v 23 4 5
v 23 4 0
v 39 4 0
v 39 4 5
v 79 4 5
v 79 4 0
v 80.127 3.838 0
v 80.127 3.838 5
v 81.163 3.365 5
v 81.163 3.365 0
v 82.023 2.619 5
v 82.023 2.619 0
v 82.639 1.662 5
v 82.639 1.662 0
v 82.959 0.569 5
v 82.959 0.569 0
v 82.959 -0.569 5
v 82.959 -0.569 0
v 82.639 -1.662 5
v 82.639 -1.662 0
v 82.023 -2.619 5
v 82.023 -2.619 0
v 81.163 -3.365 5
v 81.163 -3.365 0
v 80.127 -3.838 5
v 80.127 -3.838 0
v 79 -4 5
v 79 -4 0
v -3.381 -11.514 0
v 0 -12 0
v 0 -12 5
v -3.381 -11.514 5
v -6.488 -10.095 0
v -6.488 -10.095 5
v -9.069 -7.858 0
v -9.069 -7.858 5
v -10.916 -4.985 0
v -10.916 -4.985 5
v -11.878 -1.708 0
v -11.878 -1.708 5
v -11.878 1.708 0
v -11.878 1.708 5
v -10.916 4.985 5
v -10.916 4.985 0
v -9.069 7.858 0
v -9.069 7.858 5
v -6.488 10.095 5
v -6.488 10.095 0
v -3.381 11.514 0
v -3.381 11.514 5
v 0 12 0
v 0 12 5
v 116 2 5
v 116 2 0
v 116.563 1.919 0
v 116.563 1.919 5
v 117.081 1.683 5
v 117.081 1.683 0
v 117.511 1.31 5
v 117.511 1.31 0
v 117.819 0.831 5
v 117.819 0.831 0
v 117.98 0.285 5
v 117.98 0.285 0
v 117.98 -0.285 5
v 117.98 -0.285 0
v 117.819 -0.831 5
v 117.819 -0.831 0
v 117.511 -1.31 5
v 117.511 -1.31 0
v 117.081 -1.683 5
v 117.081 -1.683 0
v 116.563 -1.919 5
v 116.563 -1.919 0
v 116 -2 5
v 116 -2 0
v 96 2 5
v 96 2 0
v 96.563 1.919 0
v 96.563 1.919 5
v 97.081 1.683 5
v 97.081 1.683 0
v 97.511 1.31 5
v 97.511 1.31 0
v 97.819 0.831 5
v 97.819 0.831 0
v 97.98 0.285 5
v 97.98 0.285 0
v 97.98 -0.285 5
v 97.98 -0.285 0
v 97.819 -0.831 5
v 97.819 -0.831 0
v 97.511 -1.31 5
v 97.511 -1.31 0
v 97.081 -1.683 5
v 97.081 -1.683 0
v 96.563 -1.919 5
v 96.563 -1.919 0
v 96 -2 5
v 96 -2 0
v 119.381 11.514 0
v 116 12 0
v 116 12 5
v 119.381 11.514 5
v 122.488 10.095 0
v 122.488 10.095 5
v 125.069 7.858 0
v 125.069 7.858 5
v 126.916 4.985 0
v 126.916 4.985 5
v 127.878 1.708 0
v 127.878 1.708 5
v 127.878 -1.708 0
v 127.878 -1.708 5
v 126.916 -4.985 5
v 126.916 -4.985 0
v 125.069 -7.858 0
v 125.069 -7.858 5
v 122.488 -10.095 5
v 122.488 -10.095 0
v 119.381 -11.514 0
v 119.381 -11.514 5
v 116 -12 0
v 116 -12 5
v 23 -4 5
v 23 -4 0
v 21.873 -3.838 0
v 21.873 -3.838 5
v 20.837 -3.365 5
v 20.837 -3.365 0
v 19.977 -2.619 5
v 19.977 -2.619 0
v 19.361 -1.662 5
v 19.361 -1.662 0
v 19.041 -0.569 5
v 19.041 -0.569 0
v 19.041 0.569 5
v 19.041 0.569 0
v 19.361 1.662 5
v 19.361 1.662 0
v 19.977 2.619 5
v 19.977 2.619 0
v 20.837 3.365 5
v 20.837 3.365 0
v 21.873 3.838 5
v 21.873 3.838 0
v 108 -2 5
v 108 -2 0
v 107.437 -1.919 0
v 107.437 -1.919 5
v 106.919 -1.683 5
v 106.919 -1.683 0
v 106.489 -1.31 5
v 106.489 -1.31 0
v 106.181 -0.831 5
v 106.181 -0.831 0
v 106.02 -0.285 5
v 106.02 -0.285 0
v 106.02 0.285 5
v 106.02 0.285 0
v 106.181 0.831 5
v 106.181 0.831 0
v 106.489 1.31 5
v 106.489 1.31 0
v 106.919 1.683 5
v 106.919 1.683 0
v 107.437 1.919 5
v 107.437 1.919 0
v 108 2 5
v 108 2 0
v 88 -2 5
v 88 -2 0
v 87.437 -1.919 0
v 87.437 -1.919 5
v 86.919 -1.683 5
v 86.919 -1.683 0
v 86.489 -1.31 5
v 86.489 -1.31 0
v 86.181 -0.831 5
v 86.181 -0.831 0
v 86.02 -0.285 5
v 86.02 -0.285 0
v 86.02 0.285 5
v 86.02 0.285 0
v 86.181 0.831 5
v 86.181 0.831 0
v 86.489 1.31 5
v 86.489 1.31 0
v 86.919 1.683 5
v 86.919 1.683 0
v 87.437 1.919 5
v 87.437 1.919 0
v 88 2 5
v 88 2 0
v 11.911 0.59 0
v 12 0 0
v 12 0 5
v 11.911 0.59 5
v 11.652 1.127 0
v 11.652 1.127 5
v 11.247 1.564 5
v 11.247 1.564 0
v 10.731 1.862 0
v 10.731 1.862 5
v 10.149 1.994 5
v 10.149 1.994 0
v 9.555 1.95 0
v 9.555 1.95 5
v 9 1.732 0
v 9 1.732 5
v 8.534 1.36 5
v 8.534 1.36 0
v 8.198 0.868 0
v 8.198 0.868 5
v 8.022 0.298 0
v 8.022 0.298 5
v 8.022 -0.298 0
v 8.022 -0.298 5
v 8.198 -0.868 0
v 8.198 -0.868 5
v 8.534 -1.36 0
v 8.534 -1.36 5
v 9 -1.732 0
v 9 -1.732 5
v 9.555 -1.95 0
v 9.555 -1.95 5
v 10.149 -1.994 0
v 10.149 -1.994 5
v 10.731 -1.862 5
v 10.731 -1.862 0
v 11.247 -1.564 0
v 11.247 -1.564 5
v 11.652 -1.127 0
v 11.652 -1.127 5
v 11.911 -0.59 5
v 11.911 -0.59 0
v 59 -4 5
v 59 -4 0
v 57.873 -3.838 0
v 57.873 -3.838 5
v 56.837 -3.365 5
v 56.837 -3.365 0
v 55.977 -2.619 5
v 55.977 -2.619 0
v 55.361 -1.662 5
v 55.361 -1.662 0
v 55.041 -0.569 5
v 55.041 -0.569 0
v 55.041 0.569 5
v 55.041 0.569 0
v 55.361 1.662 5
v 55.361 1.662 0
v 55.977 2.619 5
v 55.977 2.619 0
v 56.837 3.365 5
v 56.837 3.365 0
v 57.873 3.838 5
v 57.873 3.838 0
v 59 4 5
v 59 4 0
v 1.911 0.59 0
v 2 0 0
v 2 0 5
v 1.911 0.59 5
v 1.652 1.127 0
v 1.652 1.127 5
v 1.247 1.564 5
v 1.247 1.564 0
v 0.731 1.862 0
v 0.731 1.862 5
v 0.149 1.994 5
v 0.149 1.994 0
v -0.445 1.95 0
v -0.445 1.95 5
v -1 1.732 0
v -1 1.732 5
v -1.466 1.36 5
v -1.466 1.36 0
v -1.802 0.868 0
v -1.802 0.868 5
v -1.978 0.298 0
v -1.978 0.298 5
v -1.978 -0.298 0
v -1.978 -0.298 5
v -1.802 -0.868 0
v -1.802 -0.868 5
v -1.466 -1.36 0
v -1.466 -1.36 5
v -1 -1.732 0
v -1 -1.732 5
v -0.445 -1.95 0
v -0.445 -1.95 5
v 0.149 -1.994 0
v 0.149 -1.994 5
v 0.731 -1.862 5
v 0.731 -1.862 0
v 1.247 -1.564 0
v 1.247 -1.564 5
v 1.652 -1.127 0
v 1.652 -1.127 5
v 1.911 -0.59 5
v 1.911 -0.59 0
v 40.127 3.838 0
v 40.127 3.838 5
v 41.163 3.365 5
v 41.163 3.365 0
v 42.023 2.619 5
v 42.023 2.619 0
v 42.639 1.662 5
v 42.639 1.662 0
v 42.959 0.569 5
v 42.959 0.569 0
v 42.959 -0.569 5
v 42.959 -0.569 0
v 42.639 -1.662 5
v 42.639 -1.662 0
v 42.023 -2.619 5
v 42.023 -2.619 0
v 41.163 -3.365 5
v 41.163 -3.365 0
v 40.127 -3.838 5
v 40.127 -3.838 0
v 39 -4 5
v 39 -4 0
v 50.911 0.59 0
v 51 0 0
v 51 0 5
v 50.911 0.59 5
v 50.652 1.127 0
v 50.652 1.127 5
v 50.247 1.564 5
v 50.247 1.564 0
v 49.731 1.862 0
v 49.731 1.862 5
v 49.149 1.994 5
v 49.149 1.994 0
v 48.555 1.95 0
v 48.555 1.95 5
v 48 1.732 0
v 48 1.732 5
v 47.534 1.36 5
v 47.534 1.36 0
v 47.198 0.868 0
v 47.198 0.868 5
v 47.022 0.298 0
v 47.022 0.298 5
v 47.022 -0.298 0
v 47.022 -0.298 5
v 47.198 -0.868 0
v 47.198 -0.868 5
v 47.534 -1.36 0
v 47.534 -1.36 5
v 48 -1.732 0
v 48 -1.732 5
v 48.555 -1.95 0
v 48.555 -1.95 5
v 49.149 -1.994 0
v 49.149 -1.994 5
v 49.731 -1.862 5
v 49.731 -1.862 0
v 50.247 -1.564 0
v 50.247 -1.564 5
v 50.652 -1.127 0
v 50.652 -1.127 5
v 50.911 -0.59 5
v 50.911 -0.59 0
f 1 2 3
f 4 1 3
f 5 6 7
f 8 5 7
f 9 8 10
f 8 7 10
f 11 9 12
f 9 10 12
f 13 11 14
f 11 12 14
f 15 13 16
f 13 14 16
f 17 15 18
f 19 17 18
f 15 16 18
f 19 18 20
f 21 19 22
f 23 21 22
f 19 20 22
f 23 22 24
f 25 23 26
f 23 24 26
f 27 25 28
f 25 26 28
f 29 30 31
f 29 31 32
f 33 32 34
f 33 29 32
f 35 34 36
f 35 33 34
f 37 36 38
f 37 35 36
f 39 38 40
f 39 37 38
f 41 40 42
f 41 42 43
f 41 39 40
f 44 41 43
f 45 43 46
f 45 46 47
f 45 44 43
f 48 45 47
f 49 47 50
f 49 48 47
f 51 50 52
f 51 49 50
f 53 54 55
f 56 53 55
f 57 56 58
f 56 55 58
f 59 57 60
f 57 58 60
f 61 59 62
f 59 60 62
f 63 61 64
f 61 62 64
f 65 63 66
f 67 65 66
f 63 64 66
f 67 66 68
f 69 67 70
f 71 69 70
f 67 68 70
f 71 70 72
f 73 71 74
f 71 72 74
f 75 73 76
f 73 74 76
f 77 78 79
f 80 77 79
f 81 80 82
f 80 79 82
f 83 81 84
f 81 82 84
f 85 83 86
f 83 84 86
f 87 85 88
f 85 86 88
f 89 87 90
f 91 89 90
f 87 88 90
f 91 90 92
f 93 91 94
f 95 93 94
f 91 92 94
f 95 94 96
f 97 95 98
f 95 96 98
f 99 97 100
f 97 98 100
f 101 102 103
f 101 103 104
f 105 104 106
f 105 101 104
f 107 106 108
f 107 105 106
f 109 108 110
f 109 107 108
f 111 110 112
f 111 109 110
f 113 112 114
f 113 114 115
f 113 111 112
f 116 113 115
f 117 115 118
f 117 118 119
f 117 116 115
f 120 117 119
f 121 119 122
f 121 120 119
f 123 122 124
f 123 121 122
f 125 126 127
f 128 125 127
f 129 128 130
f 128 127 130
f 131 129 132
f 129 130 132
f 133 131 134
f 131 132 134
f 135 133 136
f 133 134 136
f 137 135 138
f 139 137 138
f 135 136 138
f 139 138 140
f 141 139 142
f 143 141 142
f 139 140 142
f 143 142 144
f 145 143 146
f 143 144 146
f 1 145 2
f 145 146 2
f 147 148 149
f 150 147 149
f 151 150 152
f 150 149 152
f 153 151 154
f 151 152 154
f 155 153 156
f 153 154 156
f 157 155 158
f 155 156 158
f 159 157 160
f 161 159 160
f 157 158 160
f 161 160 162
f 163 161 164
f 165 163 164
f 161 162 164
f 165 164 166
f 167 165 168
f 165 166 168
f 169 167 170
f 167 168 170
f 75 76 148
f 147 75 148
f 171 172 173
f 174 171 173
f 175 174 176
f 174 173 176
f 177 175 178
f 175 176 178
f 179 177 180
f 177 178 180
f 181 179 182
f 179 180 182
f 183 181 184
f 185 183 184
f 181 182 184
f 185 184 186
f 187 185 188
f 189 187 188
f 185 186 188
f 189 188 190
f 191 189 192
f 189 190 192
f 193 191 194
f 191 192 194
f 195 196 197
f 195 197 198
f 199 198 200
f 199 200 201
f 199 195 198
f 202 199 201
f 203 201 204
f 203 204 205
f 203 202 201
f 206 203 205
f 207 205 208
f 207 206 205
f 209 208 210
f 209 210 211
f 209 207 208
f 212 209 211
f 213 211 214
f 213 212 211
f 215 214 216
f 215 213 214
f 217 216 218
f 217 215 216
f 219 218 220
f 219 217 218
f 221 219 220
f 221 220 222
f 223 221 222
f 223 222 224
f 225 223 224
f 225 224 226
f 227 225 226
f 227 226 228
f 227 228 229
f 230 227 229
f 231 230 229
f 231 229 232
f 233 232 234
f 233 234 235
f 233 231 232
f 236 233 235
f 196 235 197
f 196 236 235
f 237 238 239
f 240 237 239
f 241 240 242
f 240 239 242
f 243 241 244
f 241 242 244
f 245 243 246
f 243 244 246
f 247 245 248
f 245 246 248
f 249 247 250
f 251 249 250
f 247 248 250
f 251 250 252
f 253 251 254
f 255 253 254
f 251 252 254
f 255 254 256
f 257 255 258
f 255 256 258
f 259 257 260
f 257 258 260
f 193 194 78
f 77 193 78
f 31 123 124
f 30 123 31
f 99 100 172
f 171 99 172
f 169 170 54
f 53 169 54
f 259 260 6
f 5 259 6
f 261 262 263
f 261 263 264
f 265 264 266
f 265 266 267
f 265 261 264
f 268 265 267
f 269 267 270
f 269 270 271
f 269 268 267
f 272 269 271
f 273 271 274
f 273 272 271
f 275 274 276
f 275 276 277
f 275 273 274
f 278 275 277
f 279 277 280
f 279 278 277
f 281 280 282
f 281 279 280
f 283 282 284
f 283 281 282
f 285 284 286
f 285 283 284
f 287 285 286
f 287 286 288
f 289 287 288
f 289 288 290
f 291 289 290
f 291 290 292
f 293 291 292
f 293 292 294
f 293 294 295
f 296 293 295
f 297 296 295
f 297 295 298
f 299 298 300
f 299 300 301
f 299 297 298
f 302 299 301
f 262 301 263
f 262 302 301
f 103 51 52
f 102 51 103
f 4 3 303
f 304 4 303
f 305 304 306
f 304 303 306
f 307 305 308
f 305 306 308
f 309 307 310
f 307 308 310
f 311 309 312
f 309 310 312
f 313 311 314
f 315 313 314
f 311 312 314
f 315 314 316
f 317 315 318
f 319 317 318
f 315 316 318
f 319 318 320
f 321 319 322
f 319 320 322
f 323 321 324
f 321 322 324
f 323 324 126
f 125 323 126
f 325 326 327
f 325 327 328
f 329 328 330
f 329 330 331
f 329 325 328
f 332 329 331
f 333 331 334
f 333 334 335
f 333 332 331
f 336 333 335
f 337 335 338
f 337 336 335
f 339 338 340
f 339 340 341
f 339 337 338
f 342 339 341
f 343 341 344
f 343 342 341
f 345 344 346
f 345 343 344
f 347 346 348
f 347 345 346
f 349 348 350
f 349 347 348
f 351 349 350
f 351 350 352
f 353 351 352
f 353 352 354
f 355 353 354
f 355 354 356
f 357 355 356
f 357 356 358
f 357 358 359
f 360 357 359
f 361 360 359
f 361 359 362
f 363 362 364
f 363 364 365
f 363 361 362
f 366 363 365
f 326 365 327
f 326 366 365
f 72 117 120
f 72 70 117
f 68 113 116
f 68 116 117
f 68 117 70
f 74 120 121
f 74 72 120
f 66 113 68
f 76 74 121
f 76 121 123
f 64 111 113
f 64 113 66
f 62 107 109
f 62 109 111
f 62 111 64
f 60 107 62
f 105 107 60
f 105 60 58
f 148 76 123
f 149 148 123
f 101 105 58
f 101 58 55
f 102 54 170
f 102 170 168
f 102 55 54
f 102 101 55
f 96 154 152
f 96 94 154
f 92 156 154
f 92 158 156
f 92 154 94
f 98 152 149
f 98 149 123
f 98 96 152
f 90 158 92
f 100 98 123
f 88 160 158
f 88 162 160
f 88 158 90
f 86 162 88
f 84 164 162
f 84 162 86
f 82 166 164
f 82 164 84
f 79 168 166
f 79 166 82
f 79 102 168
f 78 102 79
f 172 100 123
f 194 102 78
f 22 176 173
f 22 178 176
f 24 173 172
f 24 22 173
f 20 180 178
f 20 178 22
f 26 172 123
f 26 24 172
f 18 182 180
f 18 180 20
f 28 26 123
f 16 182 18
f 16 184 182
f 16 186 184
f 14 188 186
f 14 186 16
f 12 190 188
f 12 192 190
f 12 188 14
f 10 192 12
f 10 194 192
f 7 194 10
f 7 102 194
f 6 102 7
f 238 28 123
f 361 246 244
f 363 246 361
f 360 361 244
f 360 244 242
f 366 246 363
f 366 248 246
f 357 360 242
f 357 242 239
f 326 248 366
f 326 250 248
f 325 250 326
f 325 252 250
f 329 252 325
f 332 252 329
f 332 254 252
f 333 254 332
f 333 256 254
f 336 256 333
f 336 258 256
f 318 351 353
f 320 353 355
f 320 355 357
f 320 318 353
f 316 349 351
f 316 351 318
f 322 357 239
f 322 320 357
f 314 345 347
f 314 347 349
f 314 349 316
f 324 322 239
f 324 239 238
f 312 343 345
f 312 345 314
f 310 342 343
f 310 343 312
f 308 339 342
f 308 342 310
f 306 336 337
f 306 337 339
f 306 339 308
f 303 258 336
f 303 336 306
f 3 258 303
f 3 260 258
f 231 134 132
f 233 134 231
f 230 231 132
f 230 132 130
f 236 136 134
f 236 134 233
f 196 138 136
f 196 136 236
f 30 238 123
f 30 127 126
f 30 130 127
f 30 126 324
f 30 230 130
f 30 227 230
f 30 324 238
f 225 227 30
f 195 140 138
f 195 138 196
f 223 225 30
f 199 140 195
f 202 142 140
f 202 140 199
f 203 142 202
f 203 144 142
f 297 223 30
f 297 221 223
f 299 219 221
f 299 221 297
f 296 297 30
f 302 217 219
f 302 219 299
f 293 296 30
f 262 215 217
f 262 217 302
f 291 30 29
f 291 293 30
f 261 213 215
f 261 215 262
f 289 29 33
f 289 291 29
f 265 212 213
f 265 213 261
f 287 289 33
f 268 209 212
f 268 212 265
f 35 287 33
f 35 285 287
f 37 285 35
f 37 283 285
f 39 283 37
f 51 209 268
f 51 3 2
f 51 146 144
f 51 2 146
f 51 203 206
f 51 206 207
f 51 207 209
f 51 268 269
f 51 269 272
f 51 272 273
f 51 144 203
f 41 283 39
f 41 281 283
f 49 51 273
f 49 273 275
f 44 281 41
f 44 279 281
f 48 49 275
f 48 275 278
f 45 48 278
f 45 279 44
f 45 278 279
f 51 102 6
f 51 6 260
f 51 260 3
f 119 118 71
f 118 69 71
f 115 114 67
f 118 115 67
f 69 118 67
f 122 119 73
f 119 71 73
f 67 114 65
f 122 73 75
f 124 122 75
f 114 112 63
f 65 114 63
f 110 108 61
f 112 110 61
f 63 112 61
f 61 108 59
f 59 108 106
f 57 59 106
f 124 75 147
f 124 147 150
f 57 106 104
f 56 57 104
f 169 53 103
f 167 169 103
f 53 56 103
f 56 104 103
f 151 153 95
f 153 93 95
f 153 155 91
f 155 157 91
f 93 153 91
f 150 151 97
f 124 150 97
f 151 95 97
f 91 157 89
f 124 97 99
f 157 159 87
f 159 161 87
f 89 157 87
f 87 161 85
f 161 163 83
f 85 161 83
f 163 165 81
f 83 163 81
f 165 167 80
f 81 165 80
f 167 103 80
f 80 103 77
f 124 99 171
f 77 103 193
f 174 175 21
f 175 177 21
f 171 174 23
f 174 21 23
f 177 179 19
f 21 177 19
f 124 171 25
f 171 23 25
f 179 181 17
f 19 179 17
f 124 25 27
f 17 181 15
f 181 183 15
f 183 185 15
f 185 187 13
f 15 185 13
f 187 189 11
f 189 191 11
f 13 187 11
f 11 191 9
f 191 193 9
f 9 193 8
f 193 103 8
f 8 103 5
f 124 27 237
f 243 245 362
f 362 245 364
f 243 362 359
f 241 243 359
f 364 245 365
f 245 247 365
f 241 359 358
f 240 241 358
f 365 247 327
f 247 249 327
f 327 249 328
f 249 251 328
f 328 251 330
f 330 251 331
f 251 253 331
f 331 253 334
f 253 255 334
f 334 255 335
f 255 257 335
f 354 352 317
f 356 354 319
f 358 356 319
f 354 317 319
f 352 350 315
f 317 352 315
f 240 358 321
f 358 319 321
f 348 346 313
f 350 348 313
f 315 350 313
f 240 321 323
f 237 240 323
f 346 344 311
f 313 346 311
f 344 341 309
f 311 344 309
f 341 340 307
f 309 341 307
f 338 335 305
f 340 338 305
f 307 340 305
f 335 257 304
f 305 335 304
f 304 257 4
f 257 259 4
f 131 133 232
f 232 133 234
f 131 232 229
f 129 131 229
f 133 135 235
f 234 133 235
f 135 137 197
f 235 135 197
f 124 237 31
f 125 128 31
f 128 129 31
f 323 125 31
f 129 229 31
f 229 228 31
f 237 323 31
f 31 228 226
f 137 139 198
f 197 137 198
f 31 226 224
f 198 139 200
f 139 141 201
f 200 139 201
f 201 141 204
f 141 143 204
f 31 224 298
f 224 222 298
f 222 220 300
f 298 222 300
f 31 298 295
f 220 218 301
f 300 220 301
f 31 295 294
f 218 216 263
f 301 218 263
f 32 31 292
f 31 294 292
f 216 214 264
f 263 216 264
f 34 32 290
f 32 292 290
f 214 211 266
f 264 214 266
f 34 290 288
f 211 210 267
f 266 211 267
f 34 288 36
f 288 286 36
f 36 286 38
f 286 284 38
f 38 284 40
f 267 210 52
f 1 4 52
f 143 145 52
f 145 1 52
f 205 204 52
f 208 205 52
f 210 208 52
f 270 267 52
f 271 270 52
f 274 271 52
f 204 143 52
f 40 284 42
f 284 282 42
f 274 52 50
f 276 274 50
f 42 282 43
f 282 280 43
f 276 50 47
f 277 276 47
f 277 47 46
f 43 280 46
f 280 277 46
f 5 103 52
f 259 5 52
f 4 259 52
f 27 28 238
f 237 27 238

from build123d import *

# Parameters (mm, degrees)
SKETCH_1_R      = 2
EXTRUDE_1_DEPTH = 5


with BuildPart() as part:
    # 草图1 → 凸台-拉伸1 (new body)
    with BuildSketch(Plane.XY):
        with BuildLine():
            Line((0, 12), (116, 12))
            ThreePointArc((116, 12), (128, 0), (116, -12))
            Line((116, -12), (0, -12))
            ThreePointArc((0, -12), (-12, 0), (0, 12))
        make_face()
        with Locations((49, 0)):
            Circle(SKETCH_1_R, mode=Mode.SUBTRACT)
        Circle(SKETCH_1_R, mode=Mode.SUBTRACT)
        with Locations((10, 0)):
            Circle(SKETCH_1_R, mode=Mode.SUBTRACT)
        with BuildLine():
            Line((23, 4), (39, 4))
            ThreePointArc((39, 4), (43, 0), (39, -4))
            Line((39, -4), (23, -4))
            ThreePointArc((23, -4), (19, 0), (23, 4))
        make_face(mode=Mode.SUBTRACT)
        with BuildLine():
            Line((59, 4), (79, 4))
            ThreePointArc((79, 4), (83, 0), (79, -4))
            Line((79, -4), (59, -4))
            ThreePointArc((59, -4), (55, 0), (59, 4))
        make_face(mode=Mode.SUBTRACT)
        with BuildLine():
            Line((108, 2), (116, 2))
            ThreePointArc((116, 2), (118, 0), (116, -2))
            Line((116, -2), (108, -2))
            ThreePointArc((108, -2), (106, 0), (108, 2))
        make_face(mode=Mode.SUBTRACT)
        with BuildLine():
            Line((88, 2), (96, 2))
            ThreePointArc((96, 2), (98, 0), (96, -2))
            Line((96, -2), (88, -2))
            ThreePointArc((88, -2), (86, 0), (88, 2))
        make_face(mode=Mode.SUBTRACT)
    extrude(amount=EXTRUDE_1_DEPTH)


solid = part.part
